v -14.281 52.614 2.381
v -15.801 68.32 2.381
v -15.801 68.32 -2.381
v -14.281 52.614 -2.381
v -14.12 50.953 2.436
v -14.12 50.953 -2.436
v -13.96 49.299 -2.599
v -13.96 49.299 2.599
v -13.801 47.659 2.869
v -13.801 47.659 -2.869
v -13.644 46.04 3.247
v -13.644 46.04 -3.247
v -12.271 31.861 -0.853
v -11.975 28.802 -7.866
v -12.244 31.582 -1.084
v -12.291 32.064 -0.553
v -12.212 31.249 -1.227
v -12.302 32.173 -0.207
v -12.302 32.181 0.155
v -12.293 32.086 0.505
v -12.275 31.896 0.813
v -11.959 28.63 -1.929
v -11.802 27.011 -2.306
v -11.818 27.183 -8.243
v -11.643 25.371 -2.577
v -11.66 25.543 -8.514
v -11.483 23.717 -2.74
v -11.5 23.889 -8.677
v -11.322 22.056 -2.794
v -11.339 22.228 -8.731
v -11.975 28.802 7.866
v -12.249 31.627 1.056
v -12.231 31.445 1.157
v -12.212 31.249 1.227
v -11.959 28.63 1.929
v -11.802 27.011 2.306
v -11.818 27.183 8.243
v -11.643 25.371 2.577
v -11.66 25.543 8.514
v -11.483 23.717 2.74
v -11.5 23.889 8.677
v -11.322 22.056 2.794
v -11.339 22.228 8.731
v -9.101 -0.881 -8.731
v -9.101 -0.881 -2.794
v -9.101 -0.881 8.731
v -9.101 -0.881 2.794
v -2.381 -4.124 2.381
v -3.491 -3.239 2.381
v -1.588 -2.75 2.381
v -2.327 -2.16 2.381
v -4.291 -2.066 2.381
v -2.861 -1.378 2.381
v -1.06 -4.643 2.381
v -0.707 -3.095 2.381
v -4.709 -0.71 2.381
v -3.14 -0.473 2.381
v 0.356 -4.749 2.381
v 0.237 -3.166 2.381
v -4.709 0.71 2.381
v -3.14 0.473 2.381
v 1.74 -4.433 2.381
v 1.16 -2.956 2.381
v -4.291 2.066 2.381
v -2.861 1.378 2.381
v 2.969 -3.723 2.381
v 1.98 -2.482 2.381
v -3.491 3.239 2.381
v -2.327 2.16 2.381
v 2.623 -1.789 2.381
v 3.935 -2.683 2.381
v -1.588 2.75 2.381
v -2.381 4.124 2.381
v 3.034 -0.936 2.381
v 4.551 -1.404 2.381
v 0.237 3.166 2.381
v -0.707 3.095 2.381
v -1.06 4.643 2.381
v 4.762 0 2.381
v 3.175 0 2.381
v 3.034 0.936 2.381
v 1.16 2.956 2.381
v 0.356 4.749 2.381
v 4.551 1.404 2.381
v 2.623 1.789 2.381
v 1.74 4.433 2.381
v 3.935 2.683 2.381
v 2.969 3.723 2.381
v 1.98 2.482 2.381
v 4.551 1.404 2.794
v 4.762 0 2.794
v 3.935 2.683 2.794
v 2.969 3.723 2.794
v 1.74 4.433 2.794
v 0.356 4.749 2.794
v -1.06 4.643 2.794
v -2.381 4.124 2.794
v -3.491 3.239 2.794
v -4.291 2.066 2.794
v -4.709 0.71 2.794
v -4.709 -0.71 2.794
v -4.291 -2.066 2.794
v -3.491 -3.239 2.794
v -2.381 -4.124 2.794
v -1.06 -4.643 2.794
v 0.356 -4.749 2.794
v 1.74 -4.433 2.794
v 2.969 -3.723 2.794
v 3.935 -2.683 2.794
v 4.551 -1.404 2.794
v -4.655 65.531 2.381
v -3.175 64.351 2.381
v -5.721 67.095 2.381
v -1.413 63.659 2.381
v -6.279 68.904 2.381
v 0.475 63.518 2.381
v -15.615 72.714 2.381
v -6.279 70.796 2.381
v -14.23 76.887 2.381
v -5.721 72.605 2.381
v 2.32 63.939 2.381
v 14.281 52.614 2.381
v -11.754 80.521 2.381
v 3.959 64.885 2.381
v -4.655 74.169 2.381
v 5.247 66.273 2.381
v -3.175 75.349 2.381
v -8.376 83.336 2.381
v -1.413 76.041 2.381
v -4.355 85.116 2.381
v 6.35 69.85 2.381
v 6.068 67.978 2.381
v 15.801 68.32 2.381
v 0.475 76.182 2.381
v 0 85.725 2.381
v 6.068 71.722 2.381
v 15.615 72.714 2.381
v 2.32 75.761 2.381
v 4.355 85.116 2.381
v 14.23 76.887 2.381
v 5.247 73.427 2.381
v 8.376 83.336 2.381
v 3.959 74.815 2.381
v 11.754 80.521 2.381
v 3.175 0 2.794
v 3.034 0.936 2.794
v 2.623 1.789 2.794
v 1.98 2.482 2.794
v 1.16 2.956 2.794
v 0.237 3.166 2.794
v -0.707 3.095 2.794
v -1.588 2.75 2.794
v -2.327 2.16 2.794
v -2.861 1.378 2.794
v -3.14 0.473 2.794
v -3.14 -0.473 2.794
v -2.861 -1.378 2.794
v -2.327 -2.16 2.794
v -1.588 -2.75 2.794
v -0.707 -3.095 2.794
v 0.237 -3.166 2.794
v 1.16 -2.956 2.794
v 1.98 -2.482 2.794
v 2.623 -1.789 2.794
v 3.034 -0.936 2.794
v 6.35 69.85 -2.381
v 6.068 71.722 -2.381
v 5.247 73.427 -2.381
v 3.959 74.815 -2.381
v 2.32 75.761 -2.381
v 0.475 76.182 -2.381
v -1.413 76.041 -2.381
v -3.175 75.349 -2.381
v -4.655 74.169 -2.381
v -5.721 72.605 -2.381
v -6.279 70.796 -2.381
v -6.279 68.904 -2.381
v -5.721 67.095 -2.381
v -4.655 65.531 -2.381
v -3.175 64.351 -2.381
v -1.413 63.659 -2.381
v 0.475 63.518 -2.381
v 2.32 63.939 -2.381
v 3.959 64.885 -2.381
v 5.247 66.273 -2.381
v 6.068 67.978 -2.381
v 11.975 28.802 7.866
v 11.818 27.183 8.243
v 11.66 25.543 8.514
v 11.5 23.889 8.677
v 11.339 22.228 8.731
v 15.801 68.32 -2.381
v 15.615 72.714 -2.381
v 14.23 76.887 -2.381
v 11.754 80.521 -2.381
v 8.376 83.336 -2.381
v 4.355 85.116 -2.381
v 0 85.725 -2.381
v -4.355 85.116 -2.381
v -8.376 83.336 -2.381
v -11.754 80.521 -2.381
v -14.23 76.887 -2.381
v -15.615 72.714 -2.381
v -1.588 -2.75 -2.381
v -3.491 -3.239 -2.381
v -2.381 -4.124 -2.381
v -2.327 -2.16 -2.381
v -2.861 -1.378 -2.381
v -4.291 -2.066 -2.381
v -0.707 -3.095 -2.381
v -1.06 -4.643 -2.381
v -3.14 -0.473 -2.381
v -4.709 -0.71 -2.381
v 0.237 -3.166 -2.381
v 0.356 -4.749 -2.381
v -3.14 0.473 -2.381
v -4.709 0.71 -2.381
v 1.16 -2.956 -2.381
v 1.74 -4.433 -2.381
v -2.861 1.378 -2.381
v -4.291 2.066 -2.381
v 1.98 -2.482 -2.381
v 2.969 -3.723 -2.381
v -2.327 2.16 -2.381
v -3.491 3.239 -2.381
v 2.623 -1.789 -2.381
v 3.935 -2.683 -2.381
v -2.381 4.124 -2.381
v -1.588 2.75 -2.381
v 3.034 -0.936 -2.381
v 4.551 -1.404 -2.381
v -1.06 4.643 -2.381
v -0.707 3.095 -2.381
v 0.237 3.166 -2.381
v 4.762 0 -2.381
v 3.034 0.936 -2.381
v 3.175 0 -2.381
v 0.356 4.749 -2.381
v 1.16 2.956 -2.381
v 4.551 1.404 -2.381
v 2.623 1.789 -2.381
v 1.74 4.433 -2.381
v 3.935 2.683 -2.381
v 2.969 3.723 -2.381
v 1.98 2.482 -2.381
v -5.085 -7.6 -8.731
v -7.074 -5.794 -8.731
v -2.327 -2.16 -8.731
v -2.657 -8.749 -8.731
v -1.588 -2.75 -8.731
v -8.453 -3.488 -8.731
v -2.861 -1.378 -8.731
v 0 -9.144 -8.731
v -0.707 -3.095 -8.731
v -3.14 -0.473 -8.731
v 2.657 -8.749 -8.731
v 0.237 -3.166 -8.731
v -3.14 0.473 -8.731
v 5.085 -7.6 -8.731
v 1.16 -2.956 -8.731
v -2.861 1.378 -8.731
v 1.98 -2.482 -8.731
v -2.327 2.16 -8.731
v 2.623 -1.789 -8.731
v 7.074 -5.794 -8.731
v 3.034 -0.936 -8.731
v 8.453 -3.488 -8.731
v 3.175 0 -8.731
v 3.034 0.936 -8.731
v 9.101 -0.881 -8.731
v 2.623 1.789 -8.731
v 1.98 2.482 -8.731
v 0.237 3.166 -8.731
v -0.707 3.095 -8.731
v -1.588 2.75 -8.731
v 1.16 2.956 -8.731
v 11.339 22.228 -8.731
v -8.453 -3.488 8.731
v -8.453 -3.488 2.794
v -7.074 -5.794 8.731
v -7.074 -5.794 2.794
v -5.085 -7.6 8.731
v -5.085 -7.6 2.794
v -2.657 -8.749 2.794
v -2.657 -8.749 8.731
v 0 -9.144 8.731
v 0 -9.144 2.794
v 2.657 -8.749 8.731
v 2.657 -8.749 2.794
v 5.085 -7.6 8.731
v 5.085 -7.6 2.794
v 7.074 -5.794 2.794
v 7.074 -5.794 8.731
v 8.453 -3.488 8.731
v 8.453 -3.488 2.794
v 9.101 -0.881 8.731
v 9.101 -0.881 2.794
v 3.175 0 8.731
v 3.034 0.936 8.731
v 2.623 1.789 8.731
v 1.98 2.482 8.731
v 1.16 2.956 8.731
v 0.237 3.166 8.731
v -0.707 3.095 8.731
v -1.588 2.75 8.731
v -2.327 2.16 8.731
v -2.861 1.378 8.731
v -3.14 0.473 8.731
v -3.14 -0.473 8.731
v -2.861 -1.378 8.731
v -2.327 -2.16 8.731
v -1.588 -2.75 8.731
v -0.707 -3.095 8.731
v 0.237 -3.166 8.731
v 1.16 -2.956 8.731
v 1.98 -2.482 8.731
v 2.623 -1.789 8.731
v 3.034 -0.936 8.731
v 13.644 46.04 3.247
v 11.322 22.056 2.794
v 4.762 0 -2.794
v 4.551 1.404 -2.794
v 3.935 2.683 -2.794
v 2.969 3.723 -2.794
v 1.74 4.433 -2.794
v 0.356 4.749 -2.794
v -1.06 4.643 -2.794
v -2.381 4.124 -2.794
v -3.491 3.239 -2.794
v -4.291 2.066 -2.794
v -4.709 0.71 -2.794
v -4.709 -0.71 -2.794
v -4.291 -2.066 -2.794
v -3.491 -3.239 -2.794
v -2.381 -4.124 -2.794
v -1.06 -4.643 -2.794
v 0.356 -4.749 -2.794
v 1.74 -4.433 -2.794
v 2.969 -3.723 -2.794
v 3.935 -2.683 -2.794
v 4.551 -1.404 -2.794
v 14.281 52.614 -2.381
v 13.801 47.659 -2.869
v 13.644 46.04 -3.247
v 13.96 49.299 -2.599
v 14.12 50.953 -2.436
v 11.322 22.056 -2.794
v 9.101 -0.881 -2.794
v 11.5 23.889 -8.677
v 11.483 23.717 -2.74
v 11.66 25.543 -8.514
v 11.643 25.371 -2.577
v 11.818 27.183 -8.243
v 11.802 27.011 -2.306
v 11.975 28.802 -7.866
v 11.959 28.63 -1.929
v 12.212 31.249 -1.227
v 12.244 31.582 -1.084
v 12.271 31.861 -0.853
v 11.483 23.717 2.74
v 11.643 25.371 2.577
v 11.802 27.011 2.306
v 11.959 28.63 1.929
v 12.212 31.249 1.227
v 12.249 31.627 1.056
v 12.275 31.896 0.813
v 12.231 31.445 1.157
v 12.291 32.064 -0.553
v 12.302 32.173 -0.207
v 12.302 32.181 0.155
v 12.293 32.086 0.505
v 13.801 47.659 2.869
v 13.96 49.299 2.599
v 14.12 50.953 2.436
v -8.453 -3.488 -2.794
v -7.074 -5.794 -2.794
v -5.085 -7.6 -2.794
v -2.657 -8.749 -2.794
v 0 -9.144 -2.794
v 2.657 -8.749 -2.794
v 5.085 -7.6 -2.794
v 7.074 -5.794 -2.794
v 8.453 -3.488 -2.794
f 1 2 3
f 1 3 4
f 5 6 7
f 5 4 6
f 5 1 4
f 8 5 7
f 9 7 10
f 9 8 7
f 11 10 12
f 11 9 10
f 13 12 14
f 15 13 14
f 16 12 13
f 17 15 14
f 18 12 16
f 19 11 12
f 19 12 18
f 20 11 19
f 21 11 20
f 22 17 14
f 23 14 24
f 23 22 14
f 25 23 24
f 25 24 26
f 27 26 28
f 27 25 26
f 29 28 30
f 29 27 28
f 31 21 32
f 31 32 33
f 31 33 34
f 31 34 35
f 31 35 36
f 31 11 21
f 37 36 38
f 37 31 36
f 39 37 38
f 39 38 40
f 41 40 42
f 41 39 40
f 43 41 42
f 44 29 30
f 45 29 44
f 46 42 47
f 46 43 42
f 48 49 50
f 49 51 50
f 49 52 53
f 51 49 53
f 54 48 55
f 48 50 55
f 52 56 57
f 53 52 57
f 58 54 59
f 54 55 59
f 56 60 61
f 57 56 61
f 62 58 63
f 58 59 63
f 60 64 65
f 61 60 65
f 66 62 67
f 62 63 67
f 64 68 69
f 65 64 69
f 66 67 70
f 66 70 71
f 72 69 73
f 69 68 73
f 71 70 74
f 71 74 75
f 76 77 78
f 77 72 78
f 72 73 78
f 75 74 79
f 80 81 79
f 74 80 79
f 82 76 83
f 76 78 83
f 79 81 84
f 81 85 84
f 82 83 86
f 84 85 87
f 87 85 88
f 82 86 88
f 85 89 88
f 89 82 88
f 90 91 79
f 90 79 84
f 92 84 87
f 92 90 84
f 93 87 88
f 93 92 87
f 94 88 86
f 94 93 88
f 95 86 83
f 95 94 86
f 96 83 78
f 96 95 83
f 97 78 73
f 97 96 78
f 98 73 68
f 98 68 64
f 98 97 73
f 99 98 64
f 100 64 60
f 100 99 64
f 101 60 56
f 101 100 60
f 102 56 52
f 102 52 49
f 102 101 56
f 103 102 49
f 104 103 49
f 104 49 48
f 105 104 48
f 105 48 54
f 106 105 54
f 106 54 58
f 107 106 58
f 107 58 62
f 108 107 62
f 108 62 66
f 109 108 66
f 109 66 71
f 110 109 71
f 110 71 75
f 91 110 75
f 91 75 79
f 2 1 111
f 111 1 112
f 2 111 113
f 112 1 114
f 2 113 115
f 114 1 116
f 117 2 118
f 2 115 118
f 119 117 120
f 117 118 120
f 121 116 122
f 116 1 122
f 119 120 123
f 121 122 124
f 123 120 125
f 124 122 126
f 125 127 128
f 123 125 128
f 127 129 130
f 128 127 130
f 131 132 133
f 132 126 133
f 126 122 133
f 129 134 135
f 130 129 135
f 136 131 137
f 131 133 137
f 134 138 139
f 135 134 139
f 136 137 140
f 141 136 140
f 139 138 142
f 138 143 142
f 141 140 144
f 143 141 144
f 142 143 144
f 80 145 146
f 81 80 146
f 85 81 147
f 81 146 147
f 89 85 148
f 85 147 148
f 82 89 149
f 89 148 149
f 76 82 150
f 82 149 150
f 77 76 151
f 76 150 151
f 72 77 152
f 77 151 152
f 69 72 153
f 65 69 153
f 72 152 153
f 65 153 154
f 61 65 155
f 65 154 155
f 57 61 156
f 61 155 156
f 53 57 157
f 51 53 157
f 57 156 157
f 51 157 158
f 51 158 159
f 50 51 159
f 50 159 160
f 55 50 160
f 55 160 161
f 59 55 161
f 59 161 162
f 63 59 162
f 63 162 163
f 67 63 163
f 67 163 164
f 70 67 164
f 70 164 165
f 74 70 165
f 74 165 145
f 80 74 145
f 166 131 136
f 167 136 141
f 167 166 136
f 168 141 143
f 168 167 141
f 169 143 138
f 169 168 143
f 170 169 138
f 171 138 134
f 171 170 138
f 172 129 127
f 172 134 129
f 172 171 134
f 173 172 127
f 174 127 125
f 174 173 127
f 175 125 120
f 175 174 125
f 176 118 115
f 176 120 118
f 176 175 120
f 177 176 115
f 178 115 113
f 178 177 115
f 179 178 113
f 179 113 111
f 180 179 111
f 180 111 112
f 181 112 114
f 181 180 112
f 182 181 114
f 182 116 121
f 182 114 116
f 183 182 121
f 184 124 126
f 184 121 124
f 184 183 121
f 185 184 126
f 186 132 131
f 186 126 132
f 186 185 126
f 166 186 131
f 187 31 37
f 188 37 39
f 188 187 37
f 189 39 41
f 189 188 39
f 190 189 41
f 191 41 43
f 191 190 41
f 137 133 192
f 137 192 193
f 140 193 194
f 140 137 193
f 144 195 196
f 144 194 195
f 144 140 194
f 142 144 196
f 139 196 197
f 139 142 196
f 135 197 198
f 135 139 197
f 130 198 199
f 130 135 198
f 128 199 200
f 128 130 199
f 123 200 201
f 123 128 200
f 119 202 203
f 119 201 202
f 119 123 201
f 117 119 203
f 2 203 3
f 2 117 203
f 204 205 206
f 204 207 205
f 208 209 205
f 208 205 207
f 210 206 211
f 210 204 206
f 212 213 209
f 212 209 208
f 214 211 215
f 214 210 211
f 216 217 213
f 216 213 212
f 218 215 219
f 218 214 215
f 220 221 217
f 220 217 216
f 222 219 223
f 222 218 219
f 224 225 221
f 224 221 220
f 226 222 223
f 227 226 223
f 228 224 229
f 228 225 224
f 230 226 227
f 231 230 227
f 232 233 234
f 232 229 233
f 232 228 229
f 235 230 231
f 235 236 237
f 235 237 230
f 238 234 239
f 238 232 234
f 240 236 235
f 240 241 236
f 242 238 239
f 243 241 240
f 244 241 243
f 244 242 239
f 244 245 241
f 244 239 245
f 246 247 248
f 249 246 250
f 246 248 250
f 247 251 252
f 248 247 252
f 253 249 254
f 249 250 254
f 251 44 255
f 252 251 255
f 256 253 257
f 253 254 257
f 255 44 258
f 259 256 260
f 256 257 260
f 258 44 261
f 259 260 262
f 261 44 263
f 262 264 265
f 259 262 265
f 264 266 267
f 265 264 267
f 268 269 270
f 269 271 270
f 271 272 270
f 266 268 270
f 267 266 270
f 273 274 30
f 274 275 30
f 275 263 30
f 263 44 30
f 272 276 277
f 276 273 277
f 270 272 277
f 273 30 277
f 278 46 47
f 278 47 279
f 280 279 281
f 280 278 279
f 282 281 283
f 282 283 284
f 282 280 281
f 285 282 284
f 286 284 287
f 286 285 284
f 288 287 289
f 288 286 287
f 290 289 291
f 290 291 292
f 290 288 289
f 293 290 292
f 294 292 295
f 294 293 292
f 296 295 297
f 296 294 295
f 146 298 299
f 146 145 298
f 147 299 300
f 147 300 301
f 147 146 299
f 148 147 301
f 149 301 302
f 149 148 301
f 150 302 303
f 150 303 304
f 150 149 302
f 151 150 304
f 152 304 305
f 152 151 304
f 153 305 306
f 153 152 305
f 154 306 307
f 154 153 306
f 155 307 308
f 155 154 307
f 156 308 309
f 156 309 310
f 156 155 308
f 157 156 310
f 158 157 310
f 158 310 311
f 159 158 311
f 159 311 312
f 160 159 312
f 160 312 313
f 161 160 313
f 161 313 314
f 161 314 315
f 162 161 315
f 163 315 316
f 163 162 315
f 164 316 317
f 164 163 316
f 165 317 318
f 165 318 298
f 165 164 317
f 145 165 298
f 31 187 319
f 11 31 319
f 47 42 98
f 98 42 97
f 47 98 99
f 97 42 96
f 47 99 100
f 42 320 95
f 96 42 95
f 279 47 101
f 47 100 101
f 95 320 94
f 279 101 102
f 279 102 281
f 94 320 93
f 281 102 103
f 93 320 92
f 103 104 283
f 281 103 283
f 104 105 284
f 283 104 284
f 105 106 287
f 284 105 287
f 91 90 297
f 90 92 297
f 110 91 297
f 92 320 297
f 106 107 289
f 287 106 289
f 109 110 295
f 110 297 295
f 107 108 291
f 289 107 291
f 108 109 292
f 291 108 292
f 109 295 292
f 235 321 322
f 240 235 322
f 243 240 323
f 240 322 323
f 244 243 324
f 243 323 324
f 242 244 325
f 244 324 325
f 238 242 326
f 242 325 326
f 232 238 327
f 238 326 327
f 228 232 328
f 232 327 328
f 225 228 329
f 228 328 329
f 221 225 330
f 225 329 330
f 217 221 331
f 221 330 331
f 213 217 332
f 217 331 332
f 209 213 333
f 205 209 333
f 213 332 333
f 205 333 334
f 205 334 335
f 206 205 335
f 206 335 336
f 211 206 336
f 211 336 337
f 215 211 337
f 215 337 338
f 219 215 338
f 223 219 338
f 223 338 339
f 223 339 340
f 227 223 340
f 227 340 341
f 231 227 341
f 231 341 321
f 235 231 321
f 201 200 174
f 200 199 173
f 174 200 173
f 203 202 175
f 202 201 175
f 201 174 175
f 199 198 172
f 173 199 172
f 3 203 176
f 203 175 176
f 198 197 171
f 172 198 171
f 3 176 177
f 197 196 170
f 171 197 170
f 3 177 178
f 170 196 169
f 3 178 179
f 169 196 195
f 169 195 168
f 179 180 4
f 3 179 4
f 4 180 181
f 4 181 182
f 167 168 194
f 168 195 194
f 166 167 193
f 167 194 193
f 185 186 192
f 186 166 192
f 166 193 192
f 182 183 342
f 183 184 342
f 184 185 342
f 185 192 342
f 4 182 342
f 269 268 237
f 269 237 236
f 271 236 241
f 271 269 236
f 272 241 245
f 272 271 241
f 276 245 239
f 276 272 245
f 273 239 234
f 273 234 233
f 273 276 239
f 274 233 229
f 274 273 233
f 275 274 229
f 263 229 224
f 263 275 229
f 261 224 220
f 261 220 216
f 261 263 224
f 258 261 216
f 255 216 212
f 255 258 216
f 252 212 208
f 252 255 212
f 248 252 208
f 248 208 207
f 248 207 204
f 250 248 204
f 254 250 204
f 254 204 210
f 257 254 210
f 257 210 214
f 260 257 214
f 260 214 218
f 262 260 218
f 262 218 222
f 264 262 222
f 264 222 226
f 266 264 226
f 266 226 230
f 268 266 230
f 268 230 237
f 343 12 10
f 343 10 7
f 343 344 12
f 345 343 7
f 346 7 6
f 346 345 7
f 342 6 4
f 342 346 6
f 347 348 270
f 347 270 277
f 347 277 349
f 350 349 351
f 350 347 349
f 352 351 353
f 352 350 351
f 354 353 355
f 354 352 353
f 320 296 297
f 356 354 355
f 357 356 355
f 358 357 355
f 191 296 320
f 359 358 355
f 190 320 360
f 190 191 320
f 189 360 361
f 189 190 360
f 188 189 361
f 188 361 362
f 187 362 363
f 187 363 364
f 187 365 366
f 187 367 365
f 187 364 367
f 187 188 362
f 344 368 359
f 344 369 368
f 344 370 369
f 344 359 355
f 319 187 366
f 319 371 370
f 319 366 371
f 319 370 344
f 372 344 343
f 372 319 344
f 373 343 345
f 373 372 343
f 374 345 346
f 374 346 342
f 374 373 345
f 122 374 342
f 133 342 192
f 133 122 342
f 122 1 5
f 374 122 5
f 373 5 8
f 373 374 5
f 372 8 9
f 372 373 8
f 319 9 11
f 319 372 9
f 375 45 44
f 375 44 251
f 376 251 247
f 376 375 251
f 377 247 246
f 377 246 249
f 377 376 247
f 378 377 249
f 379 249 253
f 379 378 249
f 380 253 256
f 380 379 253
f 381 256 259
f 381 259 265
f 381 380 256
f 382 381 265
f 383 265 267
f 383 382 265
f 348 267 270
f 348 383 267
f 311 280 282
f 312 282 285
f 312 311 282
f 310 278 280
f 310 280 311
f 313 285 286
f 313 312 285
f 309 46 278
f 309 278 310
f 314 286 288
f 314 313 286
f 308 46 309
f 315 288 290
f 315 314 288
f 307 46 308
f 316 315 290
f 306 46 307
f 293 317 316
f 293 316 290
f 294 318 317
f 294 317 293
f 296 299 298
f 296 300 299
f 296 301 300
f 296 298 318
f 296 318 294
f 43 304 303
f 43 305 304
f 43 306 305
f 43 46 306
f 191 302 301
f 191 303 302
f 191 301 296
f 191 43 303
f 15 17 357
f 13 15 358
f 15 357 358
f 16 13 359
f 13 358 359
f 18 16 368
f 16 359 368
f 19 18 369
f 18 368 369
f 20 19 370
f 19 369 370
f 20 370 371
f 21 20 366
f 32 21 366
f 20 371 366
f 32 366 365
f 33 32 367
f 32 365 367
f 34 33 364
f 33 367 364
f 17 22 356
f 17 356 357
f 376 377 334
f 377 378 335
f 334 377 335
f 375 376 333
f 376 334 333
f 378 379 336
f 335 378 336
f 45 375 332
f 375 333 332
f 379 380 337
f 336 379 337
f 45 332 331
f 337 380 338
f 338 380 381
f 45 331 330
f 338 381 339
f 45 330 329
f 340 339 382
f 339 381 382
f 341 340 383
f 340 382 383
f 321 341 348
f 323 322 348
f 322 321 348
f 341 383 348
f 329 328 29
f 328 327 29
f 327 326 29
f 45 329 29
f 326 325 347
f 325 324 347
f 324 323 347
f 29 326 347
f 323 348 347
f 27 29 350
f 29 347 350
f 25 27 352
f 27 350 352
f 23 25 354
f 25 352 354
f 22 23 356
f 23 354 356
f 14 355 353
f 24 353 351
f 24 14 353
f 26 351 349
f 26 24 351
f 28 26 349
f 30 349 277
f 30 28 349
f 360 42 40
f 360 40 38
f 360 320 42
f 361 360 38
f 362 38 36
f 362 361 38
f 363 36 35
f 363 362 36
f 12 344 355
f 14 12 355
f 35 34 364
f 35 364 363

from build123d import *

# Parameters (mm, degrees)
SKETCH1_R               = 3.175
SKETCH1_R_2             = 6.35
BOSS_EXTRUDE1_DEPTH     = 8.73125
CUT_EXTRUDE1_DEPTH      = 16.875
CUT_EXTRUDE1_DEPTH_BACK = 16.875
SKETCH3_R               = 4.7625
SKETCH3_R_2             = 3.175
BOSS_EXTRUDE2_DEPTH     = 6.35
FILLET1_R               = 25.4
FILLET2_R               = 1.27


with BuildPart() as part:
    # Sketch1 → Boss-Extrude1 (new body, symmetric)
    with BuildSketch(Plane.XY):
        with BuildLine():
            Line((-15.801120859, 68.320227273), (-9.101445615, -0.881149091))
            ThreePointArc((-9.101445615, -0.881149091), (0, -9.144), (9.101445615, -0.881149091))
            Line((9.101445615, -0.881149091), (15.801120859, 68.320227273))
            ThreePointArc((15.801120859, 68.320227273), (0, 85.725), (-15.801120859, 68.320227273))
        make_face()
        Circle(SKETCH1_R, mode=Mode.SUBTRACT)
        with Locations((0, 69.85)):
            Circle(SKETCH1_R_2, mode=Mode.SUBTRACT)
    extrude(amount=BOSS_EXTRUDE1_DEPTH, both=True)

    # Sketch2 → Cut-Extrude1 (cut, two sides)
    with BuildSketch(Plane(origin=(0, -0.404650896, 0), x_dir=(0, 0, -1), z_dir=(1, 0, 0))) as cut_extrude1_sk:
        Polygon((-2.38125, 49.674878169), (-2.38125, 86.129650896), (-8.73125, 86.129650896), (-8.73125, 68.724878169), (-8.73125, 25.976355541), align=None)
        Polygon((8.73125, 68.724878169), (8.73125, 86.129650896), (2.38125, 86.129650896), (2.38125, 49.674878169), (8.73125, 25.976355541), align=None)
        Polygon((-2.794, 25.804650896), (-2.794, -8.739349104), (2.794, -8.739349104), (2.794, 25.804650896), (0, 36.232000852), align=None)
    extrude(amount=CUT_EXTRUDE1_DEPTH, mode=Mode.SUBTRACT)
    extrude(cut_extrude1_sk.sketch, amount=-CUT_EXTRUDE1_DEPTH_BACK, mode=Mode.SUBTRACT)

    # Sketch3 → Boss-Extrude2 (add)
    with BuildSketch(Plane.XY.offset(8.73125)):
        Circle(SKETCH3_R)
        Circle(SKETCH3_R_2, mode=Mode.SUBTRACT)
    boss_extrude2 = extrude(amount=-BOSS_EXTRUDE2_DEPTH)

    # Mirror1: Boss-Extrude2 across plane
    add(boss_extrude2.mirror(Plane.XY))

    # Fillet1
    fillet1_edges = [part.edges().sort_by_distance(p)[0] for p in [
        (0, 25.571704645, -8.73125),
        (0, 49.270227273, -2.38125),
        (0, 25.4, 2.794),
        (0, 25.4, -2.794),
        (0, 49.270227273, 2.38125),
        (0, 25.571704645, 8.73125),
    ]]
    fillet(fillet1_edges, radius=FILLET1_R)

    # Fillet2
    fillet2_edges = [part.edges().sort_by_distance(p)[0] for p in [
        (0, 35.827349956, 0),
    ]]
    fillet(fillet2_edges, radius=FILLET2_R)


solid = part.part
